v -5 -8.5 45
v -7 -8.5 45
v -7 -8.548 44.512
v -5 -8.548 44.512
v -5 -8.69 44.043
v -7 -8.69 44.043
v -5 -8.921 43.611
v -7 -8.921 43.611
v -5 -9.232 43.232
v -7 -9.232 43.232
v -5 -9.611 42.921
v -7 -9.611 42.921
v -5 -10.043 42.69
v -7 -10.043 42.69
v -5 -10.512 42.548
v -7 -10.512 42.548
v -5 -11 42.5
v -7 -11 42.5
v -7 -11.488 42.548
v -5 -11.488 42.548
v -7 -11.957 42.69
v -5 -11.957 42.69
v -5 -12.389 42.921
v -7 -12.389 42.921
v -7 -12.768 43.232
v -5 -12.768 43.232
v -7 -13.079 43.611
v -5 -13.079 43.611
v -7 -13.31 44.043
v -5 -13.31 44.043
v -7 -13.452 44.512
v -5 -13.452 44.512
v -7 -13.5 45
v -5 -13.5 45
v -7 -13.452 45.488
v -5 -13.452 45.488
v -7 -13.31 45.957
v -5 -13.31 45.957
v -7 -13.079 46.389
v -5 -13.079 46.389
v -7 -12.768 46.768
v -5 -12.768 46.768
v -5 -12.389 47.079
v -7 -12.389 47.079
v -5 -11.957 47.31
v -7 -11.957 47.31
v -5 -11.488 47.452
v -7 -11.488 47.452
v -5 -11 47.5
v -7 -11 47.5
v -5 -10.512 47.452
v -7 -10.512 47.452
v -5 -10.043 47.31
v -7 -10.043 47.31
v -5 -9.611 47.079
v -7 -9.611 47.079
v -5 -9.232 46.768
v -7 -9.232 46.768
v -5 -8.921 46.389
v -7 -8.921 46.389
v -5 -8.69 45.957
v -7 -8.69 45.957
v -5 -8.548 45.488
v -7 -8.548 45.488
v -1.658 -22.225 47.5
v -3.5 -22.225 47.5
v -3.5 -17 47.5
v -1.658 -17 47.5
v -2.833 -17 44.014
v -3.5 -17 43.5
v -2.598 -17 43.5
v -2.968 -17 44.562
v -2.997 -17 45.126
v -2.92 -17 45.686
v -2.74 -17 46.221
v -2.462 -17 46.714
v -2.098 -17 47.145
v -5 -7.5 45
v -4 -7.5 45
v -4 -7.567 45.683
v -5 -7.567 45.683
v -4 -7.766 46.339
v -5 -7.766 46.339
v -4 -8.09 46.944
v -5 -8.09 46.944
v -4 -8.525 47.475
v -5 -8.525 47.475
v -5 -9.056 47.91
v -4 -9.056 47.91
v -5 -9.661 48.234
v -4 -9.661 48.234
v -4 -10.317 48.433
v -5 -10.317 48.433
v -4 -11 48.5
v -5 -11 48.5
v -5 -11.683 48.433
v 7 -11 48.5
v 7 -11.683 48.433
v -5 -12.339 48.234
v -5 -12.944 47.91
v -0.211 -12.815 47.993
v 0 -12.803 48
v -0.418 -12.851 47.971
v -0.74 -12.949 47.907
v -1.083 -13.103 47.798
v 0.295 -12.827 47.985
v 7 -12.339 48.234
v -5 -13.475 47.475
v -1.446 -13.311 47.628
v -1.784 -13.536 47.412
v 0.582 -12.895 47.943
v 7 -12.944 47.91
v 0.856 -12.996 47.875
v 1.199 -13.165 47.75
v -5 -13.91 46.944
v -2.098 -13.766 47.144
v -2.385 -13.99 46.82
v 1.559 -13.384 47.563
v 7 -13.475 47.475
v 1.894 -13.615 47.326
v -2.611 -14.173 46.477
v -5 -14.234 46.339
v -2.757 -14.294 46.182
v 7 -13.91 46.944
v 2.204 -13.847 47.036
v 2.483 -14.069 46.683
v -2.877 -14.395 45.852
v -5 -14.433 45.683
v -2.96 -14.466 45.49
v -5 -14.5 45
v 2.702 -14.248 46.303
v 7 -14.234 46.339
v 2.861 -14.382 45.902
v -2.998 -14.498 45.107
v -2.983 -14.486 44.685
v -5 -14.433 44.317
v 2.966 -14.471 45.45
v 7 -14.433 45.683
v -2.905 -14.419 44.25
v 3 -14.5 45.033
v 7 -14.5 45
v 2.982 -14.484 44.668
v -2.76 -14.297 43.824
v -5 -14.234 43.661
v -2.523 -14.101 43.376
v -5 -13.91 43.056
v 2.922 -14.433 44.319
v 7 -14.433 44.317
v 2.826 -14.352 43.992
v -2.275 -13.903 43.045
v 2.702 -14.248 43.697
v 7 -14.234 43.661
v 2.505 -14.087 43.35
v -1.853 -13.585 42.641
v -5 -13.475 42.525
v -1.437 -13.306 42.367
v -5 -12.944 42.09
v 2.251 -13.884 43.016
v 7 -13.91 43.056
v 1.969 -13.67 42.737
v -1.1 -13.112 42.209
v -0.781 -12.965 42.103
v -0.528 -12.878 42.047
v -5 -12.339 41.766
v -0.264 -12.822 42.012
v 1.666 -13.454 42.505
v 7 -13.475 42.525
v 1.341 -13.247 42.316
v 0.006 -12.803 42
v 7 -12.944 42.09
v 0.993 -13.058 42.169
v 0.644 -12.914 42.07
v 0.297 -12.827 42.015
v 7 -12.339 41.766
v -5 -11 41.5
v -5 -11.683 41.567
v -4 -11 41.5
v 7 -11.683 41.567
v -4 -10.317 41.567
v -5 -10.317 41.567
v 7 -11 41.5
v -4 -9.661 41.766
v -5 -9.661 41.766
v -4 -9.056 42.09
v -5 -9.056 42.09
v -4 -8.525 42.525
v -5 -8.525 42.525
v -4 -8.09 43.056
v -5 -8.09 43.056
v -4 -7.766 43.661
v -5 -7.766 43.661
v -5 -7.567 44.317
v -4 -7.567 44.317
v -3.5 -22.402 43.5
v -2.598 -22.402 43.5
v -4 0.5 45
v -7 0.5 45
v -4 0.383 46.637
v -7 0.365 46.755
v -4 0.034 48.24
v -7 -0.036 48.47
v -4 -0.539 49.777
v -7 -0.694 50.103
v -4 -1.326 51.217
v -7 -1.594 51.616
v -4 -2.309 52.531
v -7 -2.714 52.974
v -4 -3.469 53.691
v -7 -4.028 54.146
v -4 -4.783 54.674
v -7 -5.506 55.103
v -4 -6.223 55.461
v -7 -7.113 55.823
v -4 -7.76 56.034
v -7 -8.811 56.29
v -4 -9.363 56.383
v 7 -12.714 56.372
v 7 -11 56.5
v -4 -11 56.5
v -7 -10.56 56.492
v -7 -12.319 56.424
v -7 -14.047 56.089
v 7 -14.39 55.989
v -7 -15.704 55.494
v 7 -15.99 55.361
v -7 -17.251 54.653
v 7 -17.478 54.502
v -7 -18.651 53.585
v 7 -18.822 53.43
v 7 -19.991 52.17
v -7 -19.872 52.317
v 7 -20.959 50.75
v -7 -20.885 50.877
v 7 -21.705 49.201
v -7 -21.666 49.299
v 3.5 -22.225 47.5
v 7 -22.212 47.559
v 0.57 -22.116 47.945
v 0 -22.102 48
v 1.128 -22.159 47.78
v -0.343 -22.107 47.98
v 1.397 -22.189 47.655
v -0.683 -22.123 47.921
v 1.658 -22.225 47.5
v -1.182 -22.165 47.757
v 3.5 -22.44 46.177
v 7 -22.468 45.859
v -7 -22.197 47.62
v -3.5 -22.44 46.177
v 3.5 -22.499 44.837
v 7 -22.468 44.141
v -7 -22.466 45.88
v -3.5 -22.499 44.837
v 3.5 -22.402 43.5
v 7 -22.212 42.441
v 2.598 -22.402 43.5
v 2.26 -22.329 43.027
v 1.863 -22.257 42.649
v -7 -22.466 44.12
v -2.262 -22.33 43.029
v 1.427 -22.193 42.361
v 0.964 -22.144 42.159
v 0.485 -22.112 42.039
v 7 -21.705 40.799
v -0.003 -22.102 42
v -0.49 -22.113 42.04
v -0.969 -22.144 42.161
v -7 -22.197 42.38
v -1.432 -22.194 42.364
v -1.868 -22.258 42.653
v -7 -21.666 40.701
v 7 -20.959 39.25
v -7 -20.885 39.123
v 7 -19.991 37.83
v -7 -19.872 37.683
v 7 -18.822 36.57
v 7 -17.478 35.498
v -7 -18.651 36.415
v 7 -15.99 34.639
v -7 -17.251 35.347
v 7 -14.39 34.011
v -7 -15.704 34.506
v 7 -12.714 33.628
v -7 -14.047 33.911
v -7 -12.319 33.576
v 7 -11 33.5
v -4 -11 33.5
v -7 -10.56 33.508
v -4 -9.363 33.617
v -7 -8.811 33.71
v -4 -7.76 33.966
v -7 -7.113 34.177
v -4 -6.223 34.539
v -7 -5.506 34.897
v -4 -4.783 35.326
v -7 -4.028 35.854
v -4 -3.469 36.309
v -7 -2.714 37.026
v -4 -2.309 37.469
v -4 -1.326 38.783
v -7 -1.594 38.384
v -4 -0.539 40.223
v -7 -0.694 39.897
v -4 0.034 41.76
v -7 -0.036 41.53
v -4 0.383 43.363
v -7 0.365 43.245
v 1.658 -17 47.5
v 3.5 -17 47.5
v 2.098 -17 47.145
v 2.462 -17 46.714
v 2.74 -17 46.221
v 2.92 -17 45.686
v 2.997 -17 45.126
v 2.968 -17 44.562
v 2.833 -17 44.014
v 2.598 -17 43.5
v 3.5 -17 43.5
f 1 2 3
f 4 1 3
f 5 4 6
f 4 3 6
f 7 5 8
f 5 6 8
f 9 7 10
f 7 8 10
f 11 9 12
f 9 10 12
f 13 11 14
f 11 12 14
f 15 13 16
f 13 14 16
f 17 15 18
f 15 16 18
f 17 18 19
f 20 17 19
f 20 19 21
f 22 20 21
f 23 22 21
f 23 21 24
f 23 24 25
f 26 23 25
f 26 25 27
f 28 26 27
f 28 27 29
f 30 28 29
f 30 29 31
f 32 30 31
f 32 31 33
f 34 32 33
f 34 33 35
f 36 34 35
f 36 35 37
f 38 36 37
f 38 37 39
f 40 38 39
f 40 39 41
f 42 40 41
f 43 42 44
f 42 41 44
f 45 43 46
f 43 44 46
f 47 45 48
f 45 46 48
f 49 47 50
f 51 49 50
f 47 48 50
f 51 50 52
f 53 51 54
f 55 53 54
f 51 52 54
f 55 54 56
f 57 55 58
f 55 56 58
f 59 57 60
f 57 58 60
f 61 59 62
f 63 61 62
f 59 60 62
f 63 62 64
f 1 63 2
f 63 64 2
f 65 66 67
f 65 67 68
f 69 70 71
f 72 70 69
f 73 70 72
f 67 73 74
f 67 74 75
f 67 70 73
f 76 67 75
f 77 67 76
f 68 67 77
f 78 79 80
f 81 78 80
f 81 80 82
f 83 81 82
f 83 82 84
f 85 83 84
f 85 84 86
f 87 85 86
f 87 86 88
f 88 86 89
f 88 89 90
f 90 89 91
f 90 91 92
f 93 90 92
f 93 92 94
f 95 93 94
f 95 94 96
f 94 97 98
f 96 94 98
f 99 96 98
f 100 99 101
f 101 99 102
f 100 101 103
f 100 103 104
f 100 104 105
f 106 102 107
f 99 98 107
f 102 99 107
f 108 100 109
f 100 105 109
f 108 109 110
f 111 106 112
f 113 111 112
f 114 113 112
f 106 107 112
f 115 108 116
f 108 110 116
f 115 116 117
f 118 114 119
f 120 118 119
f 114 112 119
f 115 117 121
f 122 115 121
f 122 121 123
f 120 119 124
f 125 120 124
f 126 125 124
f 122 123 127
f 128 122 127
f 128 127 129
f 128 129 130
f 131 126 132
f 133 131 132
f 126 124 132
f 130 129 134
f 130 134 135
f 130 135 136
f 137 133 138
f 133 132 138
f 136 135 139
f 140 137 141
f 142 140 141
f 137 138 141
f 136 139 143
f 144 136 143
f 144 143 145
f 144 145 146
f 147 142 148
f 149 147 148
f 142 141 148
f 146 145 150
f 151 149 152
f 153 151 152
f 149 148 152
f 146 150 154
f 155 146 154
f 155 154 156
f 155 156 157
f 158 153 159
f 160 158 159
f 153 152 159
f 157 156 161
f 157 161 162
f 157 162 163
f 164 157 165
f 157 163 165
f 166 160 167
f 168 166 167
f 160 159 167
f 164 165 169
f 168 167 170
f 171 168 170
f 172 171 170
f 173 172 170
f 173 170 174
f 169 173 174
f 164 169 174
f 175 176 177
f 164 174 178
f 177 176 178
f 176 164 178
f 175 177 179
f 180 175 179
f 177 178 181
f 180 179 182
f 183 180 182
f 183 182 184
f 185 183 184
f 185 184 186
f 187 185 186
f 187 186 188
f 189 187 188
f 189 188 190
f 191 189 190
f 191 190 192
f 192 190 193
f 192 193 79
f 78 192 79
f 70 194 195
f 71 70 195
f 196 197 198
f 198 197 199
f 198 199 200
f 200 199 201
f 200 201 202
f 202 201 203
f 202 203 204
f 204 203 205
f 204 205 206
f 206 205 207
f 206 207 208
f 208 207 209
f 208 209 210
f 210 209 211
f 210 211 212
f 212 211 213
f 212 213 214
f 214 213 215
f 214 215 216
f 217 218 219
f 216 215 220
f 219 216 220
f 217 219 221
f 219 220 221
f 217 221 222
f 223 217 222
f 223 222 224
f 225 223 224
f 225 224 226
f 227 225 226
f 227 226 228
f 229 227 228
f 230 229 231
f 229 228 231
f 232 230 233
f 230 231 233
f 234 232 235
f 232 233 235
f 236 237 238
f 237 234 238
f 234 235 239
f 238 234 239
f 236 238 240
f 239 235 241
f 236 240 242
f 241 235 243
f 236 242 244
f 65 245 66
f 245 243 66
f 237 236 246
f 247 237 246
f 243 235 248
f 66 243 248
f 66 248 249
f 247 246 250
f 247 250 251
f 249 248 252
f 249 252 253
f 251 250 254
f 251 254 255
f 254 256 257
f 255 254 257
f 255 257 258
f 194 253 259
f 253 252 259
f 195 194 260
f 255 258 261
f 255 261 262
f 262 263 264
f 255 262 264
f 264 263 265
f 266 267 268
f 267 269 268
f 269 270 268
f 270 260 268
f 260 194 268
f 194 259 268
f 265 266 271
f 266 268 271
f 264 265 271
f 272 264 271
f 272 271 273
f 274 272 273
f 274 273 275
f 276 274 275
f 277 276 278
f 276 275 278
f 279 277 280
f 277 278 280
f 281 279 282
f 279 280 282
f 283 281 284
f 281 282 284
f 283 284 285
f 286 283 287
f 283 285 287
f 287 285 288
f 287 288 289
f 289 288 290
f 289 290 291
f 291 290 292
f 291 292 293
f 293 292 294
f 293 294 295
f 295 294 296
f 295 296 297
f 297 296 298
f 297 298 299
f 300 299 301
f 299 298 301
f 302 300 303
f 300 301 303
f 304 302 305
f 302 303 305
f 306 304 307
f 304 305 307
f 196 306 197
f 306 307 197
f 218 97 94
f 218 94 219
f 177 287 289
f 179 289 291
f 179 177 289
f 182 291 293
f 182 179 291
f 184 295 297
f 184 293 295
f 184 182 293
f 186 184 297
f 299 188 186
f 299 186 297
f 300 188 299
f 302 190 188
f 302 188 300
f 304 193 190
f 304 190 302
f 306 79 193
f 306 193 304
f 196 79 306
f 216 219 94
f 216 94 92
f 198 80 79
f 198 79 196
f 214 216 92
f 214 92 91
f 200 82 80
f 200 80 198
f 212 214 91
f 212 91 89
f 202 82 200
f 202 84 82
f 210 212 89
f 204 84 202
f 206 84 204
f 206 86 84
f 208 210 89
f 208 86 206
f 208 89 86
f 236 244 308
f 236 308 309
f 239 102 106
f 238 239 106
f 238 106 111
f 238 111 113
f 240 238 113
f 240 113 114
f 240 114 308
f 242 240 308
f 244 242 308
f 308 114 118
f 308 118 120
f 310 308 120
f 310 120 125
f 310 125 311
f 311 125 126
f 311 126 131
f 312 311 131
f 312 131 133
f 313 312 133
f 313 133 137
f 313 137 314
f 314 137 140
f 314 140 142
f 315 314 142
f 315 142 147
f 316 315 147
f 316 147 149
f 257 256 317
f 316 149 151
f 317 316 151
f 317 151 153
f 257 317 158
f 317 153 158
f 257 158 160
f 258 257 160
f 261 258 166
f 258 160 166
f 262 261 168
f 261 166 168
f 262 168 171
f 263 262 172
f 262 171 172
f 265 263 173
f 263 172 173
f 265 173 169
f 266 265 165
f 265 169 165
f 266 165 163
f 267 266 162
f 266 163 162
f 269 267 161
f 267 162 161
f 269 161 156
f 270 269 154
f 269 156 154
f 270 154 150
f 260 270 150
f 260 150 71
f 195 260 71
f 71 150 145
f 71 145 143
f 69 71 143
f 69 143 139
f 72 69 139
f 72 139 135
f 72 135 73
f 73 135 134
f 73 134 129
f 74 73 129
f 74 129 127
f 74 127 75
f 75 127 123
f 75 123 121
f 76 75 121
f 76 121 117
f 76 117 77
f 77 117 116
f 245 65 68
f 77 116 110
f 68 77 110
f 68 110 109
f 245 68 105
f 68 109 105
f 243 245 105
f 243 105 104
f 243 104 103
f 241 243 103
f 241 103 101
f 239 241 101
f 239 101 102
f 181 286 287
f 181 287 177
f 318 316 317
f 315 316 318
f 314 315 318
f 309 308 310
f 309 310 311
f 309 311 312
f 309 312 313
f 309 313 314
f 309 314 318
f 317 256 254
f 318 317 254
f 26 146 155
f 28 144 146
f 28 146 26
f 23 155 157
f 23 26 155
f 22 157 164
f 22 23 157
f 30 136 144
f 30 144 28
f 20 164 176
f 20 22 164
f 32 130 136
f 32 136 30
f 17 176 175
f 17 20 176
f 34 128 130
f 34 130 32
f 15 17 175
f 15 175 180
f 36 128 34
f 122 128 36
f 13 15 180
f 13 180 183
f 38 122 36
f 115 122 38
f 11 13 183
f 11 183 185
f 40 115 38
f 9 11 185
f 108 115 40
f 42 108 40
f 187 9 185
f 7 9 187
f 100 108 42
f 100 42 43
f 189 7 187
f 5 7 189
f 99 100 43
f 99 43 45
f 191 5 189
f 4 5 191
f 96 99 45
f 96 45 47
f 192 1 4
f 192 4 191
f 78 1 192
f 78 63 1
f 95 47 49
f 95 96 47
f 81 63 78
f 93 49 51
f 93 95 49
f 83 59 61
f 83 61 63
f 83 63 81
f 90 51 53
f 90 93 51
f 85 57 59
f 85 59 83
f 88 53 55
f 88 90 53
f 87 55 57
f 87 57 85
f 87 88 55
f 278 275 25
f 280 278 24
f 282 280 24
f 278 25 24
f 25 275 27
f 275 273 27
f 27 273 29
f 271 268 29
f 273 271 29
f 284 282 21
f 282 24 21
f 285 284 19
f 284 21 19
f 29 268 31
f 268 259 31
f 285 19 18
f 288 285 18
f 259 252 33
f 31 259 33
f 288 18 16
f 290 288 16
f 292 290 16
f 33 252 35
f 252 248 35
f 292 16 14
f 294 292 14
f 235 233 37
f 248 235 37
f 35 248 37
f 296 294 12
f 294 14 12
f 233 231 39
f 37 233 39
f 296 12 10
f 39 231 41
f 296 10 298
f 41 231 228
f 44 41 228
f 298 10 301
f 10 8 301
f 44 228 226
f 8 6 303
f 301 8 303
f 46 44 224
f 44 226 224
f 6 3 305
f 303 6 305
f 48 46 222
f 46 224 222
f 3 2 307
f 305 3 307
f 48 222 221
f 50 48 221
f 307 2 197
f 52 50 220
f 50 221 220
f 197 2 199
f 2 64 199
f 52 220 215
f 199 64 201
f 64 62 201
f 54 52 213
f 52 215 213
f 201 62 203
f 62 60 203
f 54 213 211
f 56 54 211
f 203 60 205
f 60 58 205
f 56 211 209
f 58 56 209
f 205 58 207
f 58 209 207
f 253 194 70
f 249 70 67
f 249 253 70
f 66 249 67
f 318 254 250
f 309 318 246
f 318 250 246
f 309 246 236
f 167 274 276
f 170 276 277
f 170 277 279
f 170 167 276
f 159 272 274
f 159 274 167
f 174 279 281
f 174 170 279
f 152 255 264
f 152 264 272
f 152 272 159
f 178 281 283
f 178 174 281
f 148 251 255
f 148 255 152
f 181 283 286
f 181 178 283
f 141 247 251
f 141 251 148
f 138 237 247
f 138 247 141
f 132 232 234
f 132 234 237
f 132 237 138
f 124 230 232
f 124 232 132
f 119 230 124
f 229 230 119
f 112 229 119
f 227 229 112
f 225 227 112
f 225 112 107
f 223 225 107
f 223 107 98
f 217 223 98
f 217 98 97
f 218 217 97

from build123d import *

# Parameters (mm, degrees)
SKETCH054_R     = 11.5
PAD018_DEPTH    = 14
SKETCH055_W     = 11.5
SKETCH055_H     = 23
POCKET033_DEPTH = 11
SKETCH056_R     = 3
POCKET034_DEPTH = 11.501
SKETCH057_R     = 2.5
POCKET035_DEPTH = 3
SKETCH058_R     = 3.5
POCKET036_DEPTH = 12
SKETCH059_W     = 7
SKETCH059_H     = 4
POCKET037_DEPTH = 8


with BuildPart() as part:
    # Sketch054 → Pad018 (new body)
    with BuildSketch(Plane.YZ):
        with Locations((-11, 45)):
            Circle(SKETCH054_R)
    extrude(amount=PAD018_DEPTH)

    # Sketch055 (on Face3 of Pad018) → Pocket033 (cut)
    with BuildSketch(Plane.YZ.offset(14)):
        with Locations((-5.25, 45)):
            Rectangle(SKETCH055_W, SKETCH055_H)
    extrude(amount=-POCKET033_DEPTH, mode=Mode.SUBTRACT)

    # Sketch056 (on Face4 of Pocket033) → Pocket034 (cut, through all)
    with BuildSketch(Plane.ZX.offset(-11)):
        with Locations((45, 7)):
            Circle(SKETCH056_R)
    extrude(amount=-POCKET034_DEPTH, mode=Mode.SUBTRACT)

    # Sketch057 (on Face5 of Pocket034) → Pocket035 (cut)
    with BuildSketch(Plane(origin=(0, 0, 0), x_dir=(0, 1, 0), z_dir=(-1, 0, 0))):
        with Locations((-11, -45)):
            Circle(SKETCH057_R)
    extrude(amount=-POCKET035_DEPTH, mode=Mode.SUBTRACT)

    # Sketch058 (on Face4 of Pocket035) → Pocket036 (cut)
    with BuildSketch(Plane.YZ.offset(14)):
        with Locations((-11, 45)):
            Circle(SKETCH058_R)
    extrude(amount=-POCKET036_DEPTH, mode=Mode.SUBTRACT)

    # Sketch059 → Pocket037 (cut)
    with BuildSketch(Plane.XZ.offset(25)):
        with Locations((7, 45.5)):
            Rectangle(SKETCH059_W, SKETCH059_H)
    extrude(amount=-POCKET037_DEPTH, mode=Mode.SUBTRACT)


with BuildPart() as part_1:
    # Body004 placement: moved
    add(part.part.moved(Location((-7, 0, 0))))


solid = part_1.part
